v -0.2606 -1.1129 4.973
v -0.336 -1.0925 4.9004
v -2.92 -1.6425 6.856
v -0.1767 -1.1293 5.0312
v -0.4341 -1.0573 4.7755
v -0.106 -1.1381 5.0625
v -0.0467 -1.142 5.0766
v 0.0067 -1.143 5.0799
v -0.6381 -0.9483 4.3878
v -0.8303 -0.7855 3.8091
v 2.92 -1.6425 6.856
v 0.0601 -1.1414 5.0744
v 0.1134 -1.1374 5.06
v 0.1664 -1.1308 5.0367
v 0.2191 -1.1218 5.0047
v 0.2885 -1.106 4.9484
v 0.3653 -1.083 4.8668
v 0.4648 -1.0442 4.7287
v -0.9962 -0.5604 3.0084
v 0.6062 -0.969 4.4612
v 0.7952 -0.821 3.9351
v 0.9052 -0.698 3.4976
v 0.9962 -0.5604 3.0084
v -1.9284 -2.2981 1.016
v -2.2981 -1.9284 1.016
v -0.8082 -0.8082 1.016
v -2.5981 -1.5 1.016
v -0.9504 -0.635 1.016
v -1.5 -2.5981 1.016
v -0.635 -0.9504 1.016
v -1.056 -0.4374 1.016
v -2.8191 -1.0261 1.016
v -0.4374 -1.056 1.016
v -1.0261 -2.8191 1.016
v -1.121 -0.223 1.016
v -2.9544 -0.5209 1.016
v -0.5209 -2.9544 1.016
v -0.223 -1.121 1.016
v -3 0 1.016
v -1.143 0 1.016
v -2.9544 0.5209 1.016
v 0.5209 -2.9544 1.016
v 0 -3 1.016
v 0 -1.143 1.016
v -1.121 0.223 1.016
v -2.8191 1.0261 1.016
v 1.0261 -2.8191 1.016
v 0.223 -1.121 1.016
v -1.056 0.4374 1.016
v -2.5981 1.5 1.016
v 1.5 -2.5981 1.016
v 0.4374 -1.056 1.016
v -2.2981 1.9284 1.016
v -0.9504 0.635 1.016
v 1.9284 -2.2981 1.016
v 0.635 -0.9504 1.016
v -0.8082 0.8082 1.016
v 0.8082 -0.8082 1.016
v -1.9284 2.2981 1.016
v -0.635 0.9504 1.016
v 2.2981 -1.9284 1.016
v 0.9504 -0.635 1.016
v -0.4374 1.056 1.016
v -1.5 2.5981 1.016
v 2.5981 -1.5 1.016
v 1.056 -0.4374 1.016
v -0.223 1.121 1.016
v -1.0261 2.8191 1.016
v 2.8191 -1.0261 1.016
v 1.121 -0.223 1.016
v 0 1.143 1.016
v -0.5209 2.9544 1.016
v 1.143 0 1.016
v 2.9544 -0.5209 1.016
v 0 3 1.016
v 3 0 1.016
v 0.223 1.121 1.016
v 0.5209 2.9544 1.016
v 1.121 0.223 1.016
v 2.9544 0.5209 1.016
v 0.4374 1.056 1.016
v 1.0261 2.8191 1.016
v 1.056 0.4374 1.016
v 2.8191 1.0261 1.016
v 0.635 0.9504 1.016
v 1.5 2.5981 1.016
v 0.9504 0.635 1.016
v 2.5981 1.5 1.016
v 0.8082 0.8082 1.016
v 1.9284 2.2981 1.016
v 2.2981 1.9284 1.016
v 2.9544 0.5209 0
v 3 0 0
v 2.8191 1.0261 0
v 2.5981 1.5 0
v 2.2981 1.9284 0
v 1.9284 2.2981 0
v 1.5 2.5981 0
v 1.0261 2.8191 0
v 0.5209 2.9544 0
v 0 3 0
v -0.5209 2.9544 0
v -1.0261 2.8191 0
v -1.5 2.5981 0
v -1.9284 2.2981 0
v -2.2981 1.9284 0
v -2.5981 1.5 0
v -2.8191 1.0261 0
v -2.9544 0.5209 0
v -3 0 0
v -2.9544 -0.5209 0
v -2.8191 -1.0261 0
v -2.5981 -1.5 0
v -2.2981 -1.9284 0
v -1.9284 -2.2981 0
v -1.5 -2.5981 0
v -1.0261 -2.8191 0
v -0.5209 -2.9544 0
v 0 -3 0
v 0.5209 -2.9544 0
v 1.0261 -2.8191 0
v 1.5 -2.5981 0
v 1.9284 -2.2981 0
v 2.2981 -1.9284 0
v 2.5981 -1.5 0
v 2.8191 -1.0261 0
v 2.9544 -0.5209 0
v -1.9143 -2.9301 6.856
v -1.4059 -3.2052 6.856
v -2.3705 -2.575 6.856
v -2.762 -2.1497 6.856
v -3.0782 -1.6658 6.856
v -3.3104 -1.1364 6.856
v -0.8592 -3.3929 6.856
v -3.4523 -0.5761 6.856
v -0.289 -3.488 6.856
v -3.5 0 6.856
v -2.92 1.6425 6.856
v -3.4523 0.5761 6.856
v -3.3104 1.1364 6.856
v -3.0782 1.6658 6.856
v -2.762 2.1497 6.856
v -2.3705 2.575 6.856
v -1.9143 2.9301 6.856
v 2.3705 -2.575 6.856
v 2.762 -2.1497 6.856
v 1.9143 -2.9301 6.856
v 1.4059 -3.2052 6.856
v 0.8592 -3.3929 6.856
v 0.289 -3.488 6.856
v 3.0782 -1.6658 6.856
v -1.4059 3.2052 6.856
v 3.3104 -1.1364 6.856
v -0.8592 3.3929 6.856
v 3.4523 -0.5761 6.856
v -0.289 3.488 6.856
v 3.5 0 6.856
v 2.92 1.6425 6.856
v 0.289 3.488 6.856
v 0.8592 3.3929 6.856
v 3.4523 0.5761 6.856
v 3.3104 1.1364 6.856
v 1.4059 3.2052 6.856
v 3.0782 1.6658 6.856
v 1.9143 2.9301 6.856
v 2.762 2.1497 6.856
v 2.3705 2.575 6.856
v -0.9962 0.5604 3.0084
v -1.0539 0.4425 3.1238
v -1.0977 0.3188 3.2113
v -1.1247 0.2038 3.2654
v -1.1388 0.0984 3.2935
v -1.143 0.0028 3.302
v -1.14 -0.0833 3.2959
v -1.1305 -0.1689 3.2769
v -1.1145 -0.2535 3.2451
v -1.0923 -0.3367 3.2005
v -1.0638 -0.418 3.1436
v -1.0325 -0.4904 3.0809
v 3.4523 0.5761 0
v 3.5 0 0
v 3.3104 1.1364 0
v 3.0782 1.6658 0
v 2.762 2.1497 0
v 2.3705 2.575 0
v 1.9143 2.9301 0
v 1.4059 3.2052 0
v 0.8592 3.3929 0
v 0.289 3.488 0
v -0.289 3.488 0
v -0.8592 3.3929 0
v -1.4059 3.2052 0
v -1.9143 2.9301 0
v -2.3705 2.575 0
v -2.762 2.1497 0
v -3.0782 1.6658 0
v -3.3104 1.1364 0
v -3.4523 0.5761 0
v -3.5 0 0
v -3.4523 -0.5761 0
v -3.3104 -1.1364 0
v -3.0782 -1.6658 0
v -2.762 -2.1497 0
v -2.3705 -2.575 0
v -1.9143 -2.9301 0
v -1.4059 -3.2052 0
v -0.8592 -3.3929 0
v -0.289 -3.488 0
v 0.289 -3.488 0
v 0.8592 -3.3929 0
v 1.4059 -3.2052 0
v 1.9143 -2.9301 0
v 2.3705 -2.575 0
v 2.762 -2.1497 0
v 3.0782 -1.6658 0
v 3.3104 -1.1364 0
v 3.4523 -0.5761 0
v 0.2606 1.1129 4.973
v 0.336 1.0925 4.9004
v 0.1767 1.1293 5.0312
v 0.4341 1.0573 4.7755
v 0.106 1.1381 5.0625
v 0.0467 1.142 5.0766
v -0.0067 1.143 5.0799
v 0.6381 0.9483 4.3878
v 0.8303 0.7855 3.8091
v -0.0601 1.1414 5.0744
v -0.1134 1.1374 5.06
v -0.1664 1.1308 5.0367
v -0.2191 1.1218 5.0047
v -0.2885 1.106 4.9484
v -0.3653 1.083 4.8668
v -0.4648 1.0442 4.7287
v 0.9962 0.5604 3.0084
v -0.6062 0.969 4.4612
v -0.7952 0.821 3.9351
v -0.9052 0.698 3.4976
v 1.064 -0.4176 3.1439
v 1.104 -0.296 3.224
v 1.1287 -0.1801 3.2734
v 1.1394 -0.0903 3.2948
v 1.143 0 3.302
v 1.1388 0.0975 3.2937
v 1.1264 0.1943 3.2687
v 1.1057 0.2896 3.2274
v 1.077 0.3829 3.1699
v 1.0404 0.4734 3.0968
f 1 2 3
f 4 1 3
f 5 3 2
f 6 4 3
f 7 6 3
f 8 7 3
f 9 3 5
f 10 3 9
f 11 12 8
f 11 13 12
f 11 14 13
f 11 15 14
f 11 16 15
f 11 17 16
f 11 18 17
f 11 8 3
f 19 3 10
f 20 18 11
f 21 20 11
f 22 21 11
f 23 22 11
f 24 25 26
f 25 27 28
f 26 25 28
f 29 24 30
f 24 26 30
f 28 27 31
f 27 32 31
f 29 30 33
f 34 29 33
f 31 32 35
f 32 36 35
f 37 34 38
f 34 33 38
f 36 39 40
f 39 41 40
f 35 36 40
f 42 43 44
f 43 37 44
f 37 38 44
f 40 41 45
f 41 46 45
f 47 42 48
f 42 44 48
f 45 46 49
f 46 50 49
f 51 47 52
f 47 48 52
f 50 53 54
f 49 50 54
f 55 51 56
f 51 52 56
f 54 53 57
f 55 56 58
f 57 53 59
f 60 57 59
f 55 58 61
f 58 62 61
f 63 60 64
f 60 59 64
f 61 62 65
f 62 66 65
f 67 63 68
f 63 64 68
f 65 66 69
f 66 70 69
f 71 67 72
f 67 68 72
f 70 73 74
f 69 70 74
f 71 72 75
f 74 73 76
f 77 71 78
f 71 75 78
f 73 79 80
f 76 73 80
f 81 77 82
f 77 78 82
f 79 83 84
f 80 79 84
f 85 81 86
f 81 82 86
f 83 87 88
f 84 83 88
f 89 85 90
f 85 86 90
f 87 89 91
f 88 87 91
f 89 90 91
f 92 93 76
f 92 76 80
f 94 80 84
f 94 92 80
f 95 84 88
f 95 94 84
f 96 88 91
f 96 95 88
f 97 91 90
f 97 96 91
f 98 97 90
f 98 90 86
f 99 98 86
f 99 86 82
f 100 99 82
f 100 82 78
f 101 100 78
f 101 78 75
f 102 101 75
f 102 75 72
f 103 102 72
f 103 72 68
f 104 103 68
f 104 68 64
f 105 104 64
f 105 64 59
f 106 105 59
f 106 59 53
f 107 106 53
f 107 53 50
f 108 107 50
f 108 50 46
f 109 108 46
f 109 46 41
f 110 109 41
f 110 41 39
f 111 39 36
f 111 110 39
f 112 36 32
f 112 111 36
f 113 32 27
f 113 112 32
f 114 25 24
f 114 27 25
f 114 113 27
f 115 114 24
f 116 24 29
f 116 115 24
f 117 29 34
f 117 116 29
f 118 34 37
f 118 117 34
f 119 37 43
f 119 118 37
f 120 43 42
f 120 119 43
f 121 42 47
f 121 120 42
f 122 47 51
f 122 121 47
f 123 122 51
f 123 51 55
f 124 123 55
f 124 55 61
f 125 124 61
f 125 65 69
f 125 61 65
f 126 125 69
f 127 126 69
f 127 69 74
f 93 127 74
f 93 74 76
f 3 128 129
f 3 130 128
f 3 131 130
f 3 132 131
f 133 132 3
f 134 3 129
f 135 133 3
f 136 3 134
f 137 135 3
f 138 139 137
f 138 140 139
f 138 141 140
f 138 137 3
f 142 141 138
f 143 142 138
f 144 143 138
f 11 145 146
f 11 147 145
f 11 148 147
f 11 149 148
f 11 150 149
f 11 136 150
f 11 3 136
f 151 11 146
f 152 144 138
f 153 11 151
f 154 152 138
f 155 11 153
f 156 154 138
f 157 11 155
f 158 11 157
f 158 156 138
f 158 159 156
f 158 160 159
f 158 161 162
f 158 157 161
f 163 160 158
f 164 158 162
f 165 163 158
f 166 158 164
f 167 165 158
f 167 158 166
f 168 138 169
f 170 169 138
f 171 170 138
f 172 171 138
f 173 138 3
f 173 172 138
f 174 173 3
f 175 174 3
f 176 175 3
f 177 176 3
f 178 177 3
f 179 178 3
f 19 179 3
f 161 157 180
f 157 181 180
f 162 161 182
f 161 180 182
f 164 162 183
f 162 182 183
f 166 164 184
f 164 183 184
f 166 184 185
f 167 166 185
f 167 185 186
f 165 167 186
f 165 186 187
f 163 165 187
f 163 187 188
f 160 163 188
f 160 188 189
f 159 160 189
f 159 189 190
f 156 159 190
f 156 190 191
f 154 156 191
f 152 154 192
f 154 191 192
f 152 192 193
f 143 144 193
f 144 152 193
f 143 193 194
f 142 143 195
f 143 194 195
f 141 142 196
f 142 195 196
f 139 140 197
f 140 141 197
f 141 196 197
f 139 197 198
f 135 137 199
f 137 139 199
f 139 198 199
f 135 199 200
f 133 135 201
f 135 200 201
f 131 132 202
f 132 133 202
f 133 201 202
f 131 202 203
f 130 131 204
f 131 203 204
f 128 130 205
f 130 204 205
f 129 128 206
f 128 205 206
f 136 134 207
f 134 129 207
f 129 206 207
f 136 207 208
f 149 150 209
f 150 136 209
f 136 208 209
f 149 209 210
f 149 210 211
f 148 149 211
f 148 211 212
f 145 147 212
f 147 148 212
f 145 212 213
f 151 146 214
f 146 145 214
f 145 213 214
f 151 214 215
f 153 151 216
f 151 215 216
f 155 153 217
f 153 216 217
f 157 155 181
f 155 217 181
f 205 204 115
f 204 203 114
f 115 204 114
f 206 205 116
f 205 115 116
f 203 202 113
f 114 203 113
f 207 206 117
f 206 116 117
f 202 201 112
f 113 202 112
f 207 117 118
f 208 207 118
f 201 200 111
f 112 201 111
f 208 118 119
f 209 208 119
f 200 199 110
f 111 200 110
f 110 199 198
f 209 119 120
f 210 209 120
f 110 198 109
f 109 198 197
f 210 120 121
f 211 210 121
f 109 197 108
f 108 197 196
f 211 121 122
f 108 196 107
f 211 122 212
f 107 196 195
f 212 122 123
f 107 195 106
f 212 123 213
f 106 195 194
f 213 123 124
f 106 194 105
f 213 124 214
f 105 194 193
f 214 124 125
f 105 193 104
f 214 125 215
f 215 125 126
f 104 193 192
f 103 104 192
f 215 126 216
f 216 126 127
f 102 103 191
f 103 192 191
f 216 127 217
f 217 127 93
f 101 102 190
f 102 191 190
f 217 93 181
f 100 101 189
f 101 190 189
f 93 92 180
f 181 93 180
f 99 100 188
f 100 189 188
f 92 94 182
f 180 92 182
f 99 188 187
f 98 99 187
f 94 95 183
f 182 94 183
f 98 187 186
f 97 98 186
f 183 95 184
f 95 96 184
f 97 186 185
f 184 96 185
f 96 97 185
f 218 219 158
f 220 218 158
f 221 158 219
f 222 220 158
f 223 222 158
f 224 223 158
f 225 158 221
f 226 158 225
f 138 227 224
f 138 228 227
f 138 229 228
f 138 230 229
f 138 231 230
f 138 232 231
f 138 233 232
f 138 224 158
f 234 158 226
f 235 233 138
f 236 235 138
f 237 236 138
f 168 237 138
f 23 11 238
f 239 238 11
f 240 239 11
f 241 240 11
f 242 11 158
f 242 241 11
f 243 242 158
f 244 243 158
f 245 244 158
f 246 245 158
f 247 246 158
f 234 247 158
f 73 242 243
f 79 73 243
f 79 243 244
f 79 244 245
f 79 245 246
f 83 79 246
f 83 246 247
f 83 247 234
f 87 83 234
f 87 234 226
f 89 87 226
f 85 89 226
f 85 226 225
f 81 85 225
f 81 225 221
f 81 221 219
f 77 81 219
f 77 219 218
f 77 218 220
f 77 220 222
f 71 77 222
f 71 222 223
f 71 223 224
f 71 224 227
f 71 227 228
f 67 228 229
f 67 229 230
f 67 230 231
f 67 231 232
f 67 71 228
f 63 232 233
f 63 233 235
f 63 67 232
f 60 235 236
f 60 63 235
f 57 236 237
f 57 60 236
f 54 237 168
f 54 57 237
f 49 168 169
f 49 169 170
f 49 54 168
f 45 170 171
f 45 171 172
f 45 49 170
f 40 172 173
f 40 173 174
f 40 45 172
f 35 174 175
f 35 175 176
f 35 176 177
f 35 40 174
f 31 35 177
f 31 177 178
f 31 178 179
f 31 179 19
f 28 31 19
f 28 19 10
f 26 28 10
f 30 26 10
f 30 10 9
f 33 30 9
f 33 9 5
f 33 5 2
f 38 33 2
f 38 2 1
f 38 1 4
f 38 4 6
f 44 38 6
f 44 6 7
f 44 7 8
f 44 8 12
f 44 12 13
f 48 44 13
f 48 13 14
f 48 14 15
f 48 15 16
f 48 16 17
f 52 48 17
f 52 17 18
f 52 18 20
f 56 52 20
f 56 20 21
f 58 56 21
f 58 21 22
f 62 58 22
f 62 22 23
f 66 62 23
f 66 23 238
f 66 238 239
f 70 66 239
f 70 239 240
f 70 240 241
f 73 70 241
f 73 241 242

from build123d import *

# Parameters (mm, degrees)
F0_R     = 3.5
F0_R_2   = 3
F1_DEPTH = 17.016
F3_R     = 3.5
F3_R_2   = 1.143
F4_DEPTH = 16
F6_W     = 16
F6_H     = 9
F8_R     = 4.119335
F9_DEPTH = 10.16


with BuildPart() as f1:
    # F0 (on Top) → F1 (new body)
    with BuildSketch(Plane.XY):
        Circle(F0_R)
        Circle(F0_R_2, mode=Mode.SUBTRACT)
    extrude(amount=F1_DEPTH)

    # F3 (on offset) → F4 (join, through all)
    with BuildSketch(Plane.XY.offset(1.016)):
        Circle(F3_R)
        Circle(F3_R_2, mode=Mode.SUBTRACT)
    extrude(amount=F4_DEPTH)

    # F6 (on offset) → F7 section 0
    with BuildSketch(Plane.XY.offset(17.016), mode=Mode.PRIVATE) as f7_s0:
        Rectangle(F6_W, F6_H)
    loft([f7_s0.sketch, Vertex(0, 0, 1.016)], mode=Mode.SUBTRACT)

    # F8 (on offset) → F9 (cut)
    with BuildSketch(Plane.XY.offset(17.016)):
        Circle(F8_R)
    extrude(amount=-F9_DEPTH, mode=Mode.SUBTRACT)


solid = f1.part
